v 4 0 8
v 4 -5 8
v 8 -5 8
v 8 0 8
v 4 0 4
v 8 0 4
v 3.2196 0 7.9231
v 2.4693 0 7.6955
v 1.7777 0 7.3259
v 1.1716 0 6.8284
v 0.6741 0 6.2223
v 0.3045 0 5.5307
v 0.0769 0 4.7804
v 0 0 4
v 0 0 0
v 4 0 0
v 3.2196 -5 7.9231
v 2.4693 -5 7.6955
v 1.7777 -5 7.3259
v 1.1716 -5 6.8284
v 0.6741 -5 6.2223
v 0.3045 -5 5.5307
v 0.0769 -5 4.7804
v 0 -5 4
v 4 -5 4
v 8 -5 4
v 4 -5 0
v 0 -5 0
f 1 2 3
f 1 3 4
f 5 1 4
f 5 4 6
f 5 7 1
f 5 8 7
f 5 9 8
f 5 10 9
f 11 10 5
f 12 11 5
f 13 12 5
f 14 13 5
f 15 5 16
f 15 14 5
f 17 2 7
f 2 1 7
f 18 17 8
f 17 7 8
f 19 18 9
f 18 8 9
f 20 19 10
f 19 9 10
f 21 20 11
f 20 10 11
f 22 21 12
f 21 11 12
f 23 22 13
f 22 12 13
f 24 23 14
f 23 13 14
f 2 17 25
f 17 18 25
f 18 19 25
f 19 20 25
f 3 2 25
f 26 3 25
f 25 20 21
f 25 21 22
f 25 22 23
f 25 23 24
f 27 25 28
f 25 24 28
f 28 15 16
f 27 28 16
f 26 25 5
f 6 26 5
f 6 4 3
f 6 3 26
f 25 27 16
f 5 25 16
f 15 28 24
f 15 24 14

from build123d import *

# Parameters (mm, degrees)
SKETCH_1_W      = 4
SKETCH_1_H      = 5
EXTRUDE_1_DEPTH = 8
SKETCH_2_W      = 4
SKETCH_2_H      = 5
EXTRUDE_2_DEPTH = 4
FILLET_2_R      = 4


with BuildPart() as part:
    # 草图1 → 凸台-拉伸1 (new body)
    with BuildSketch(Plane.XY):
        with Locations((2, -2.5)):
            Rectangle(SKETCH_1_W, SKETCH_1_H)
    extrude(amount=EXTRUDE_1_DEPTH)

    # 草图2 → 凸台-拉伸2 (add)
    with BuildSketch(Plane(origin=(4, 0, 0), x_dir=(0, 0, -1), z_dir=(1, 0, 0))):
        with Locations((-6, -2.5)):
            Rectangle(SKETCH_2_W, SKETCH_2_H)
    extrude(amount=EXTRUDE_2_DEPTH)

    # 圆角2
    fillet_2_edges = [part.edges().sort_by_distance(p)[0] for p in [
        (0, -2.5, 8),
    ]]
    fillet(fillet_2_edges, radius=FILLET_2_R)


solid = part.part
